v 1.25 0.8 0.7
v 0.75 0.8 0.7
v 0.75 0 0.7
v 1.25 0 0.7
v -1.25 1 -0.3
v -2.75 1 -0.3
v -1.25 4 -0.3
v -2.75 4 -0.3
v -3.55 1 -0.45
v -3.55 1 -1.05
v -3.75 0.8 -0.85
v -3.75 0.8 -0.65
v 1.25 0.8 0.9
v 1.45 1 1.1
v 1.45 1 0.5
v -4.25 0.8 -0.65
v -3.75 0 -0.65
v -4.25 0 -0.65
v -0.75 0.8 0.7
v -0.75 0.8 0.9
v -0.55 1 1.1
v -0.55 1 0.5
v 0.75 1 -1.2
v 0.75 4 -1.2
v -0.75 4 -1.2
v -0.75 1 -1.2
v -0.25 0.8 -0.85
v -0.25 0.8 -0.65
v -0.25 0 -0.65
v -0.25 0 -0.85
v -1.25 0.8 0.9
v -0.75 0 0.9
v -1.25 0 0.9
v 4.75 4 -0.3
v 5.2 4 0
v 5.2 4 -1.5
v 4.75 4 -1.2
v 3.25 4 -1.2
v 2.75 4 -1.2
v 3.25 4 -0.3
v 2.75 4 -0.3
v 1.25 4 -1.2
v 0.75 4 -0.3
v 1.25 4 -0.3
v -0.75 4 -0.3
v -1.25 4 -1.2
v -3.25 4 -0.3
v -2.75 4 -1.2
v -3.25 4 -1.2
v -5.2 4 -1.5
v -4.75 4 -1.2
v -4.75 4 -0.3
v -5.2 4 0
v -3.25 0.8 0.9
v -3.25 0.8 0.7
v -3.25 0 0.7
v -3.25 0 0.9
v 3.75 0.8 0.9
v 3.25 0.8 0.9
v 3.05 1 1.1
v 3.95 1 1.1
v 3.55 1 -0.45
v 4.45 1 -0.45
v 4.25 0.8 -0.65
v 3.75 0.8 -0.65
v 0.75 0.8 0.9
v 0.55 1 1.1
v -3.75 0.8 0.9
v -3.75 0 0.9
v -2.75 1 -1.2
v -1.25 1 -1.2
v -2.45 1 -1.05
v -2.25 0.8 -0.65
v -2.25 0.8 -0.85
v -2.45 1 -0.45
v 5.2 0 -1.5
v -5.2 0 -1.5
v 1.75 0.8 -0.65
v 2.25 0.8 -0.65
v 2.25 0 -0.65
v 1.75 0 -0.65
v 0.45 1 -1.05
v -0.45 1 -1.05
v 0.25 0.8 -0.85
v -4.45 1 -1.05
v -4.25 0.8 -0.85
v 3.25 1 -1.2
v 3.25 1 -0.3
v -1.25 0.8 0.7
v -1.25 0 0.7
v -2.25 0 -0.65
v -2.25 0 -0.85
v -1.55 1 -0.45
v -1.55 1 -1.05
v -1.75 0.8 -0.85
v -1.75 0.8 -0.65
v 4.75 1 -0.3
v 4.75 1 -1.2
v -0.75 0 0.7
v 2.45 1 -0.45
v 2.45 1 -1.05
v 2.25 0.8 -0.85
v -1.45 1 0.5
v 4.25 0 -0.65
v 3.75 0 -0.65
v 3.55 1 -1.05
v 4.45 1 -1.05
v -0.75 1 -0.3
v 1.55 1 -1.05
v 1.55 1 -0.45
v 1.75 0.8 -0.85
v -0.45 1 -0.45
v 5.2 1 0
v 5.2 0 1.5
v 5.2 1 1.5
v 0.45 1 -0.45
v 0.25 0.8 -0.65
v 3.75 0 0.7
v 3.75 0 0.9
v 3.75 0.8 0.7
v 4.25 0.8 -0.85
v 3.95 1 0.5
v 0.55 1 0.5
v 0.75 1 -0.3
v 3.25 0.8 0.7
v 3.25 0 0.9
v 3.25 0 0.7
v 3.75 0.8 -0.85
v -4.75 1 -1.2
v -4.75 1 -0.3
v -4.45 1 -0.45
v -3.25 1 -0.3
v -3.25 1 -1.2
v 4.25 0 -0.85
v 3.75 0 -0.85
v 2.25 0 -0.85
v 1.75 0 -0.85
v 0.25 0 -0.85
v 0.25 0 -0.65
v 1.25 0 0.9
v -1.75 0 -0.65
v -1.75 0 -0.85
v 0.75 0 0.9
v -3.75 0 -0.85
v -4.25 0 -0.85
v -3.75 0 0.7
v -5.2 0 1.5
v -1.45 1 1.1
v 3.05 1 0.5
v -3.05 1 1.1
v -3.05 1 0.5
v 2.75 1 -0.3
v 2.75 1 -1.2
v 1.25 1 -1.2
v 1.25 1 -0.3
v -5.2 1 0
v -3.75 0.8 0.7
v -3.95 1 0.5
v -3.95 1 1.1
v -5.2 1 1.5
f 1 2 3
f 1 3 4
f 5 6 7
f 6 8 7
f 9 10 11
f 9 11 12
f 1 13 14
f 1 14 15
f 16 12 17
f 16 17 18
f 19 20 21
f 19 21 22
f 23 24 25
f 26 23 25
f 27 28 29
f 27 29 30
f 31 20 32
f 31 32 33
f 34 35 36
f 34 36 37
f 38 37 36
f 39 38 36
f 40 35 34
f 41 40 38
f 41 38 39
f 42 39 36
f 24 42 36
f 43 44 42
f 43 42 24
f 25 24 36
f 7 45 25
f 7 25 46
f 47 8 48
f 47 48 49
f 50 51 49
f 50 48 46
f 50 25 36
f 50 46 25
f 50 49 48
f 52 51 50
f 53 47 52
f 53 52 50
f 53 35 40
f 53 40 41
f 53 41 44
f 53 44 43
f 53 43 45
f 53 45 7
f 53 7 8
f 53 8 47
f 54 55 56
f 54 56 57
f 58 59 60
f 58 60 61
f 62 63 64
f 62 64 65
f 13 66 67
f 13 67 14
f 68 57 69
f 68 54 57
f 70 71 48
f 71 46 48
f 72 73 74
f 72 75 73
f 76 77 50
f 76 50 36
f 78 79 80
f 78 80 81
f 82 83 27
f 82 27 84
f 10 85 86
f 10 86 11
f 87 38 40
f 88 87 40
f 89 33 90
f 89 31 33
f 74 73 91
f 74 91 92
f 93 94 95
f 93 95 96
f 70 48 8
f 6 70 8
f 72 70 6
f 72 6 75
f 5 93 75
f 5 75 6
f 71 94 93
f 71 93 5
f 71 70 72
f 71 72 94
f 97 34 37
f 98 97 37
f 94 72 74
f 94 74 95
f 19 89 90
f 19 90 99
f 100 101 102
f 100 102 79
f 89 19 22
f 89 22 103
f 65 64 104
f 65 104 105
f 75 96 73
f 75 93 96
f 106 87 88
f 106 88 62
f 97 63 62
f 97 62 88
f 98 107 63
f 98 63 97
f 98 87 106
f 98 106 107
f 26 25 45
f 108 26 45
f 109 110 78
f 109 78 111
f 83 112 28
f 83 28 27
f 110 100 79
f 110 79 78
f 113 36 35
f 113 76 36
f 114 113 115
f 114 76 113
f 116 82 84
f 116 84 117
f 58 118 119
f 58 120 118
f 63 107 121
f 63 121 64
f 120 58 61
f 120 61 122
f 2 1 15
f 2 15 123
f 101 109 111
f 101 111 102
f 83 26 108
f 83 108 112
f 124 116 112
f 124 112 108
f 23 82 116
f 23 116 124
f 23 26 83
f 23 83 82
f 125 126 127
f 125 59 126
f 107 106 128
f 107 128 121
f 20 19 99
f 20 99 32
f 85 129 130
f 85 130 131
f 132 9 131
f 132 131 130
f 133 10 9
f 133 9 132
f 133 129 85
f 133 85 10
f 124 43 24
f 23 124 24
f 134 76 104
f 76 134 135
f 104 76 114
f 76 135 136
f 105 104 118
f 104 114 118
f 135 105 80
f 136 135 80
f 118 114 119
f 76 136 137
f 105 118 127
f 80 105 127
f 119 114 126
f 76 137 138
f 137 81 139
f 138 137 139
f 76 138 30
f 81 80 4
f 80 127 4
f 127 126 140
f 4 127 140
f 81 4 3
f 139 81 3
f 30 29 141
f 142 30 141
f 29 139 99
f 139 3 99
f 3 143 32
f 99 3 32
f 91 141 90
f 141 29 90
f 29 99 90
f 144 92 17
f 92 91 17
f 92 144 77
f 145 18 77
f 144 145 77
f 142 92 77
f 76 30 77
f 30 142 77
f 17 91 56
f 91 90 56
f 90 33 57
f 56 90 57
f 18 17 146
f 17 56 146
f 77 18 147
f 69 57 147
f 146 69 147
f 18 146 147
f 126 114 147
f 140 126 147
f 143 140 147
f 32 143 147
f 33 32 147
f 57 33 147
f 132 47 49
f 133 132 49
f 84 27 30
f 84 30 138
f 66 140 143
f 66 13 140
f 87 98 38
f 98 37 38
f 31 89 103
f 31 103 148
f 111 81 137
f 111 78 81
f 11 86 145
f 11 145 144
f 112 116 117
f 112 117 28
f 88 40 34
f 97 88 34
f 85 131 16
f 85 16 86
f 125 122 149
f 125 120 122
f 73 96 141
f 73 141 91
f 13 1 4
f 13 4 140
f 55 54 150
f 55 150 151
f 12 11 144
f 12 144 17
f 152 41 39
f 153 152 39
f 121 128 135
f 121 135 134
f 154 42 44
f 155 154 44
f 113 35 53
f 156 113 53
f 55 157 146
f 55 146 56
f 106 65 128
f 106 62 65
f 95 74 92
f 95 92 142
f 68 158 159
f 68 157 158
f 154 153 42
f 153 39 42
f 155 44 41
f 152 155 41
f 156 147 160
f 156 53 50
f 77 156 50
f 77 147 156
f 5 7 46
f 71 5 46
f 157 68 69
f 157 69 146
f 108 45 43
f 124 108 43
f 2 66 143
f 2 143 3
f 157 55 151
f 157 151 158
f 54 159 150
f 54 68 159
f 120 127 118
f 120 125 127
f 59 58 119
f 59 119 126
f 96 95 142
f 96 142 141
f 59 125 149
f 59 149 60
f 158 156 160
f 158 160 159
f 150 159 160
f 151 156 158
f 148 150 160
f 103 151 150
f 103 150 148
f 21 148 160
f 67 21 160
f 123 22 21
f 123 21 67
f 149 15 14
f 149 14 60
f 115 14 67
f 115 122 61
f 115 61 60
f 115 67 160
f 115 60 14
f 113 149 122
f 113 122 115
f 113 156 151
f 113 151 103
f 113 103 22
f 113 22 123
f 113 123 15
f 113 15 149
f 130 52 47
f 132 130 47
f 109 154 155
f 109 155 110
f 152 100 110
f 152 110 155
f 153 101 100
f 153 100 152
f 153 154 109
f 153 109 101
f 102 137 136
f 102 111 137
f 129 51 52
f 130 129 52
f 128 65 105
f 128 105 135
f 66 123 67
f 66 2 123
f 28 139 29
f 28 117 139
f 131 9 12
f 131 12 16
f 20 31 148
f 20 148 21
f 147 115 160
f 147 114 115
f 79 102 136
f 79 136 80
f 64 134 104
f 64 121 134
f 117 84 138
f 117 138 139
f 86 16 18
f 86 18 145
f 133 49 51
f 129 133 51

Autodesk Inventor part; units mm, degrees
ref_plane "YZ Plane" through (0, 0, 0) normal (1, 0, 0) x (0, 1, 0)
ref_plane "XZ Plane" through (0, 0, 0) normal (0, 1, 0) x (-1, 0, 0)
ref_plane "XY Plane" through (0, 0, 0) normal (0, 0, 1) x (1, 0, 0)
sketch "Sketch1" plane through (0, 0, 0) normal (0, 1, 0) x (-1, 0, 0)
  line L0 (5.2, -1.5) -> (-5.2, -1.5)
  line L1 (-5.2, -1.5) -> (-5.2, 1.5)
  line L2 (-5.2, 1.5) -> (5.2, 1.5)
  line L3 (5.2, 1.5) -> (5.2, -1.5)
  line L4 (7.28, 0) -> (-7.28, 0) projected
  line L5 (0, -2.1) -> (0, 2.1) projected
  point P0 (0, 0)
  dimension "d0" = 10.4
  dimension "d1" = 3
extrude "Extrusion1" add sketch "Sketch1" along normal blind 4
sketch "Sketch2" plane through (0, 4, 0) normal (0, 1, 0) x (1, 0, 0)
  line L0 (-5.2, -1.5) -> (5.2, -1.5) projected
  line L1 (5.2, -1.5) -> (5.2, 1.5) projected
  line L2 (-5.2, -1.5) -> (5.2, -1.5)
  line L3 (5.2, -1.5) -> (5.2, 0)
  line L4 (5.2, 0) -> (-5.2, 0)
  line L5 (-5.2, 0) -> (-5.2, -1.5)
  line L6 (-4.75, 0.3) -> (-3.25, 0.3)
  line L7 (-3.25, 0.3) -> (-3.25, 1.2)
  line L8 (-3.25, 1.2) -> (-4.75, 1.2)
  line L9 (-4.75, 1.2) -> (-4.75, 0.3)
  line L10 (-5.2, 1.5) -> (-5.2, -1.5) projected
  line L11 (-2.75, 0.3) -> (-1.25, 0.3)
  line L12 (-1.25, 0.3) -> (-1.25, 1.2)
  line L13 (-1.25, 1.2) -> (-2.75, 1.2)
  line L14 (-2.75, 1.2) -> (-2.75, 0.3)
  line L15 (-0.75, 0.3) -> (0.75, 0.3)
  line L16 (0.75, 0.3) -> (0.75, 1.2)
  line L17 (0.75, 1.2) -> (-0.75, 1.2)
  line L18 (-0.75, 1.2) -> (-0.75, 0.3)
  line L19 (1.25, 0.3) -> (2.75, 0.3)
  line L20 (2.75, 0.3) -> (2.75, 1.2)
  line L21 (2.75, 1.2) -> (1.25, 1.2)
  line L22 (1.25, 1.2) -> (1.25, 0.3)
  line L23 (3.25, 0.3) -> (4.75, 0.3)
  line L24 (4.75, 0.3) -> (4.75, 1.2)
  line L25 (4.75, 1.2) -> (3.25, 1.2)
  line L26 (3.25, 1.2) -> (3.25, 0.3)
  point P0 (0, 0)
  dimension "d4" = 1.5
  dimension "d5" = 0.9
  dimension "d6" = 0.3
  dimension "d7" = 0.45
  dimension "d10" = 2
extrude "Extrusion2" cut sketch "Sketch2" against normal blind 3
sketch "Sketch3" plane through (0, 1, 0) normal (0, 1, 0) x (1, 0, 0)
  line L0 (3.75, -0.9) -> (3.25, -0.9)
  line L1 (3.25, -0.9) -> (3.25, -0.7)
  line L2 (3.25, -0.7) -> (3.75, -0.7)
  line L3 (3.75, -0.7) -> (3.75, -0.9)
  line L4 (5.2, 1.5) -> (-5.2, 1.5) projected
  line L5 (5.2, -1.5) -> (-5.2, -1.5) projected
  line L6 (5.2, 0) -> (5.2, -1.5) projected
  line L7 (1.25, -0.9) -> (0.75, -0.9)
  line L8 (0.75, -0.9) -> (0.75, -0.7)
  line L9 (0.75, -0.7) -> (1.25, -0.7)
  line L10 (1.25, -0.7) -> (1.25, -0.9)
  line L11 (-0.75, -0.9) -> (-1.25, -0.9)
  line L12 (-1.25, -0.9) -> (-1.25, -0.7)
  line L13 (-1.25, -0.7) -> (-0.75, -0.7)
  line L14 (-0.75, -0.7) -> (-0.75, -0.9)
  line L15 (-3.25, -0.9) -> (-3.75, -0.9)
  line L16 (-3.75, -0.9) -> (-3.75, -0.7)
  line L17 (-3.75, -0.7) -> (-3.25, -0.7)
  line L18 (-3.25, -0.7) -> (-3.25, -0.9)
  line L19 (-5.2, -1.5) -> (-5.2, 0) projected
  line L20 (-3.75, 0.65) -> (-4.25, 0.65)
  line L21 (-4.25, 0.65) -> (-4.25, 0.85)
  line L22 (-4.25, 0.85) -> (-3.75, 0.85)
  line L23 (-3.75, 0.85) -> (-3.75, 0.65)
  line L24 (-4.75, 0.3) -> (-4.75, 1.2) projected
  line L25 (-3.25, 1.2) -> (-3.25, 0.3) projected
  line L26 (-4.75, 1.2) -> (-3.25, 1.2) projected
  line L27 (-3.25, 0.3) -> (-4.75, 0.3) projected
  line L28 (-1.75, 0.85) -> (-1.75, 0.65)
  line L29 (-1.75, 0.65) -> (-2.25, 0.65)
  line L30 (-2.25, 0.85) -> (-1.75, 0.85)
  line L31 (-2.25, 0.65) -> (-2.25, 0.85)
  line L32 (0.25, 0.85) -> (0.25, 0.65)
  line L33 (0.25, 0.65) -> (-0.25, 0.65)
  line L34 (-0.25, 0.85) -> (0.25, 0.85)
  line L35 (-0.25, 0.65) -> (-0.25, 0.85)
  line L36 (2.25, 0.85) -> (2.25, 0.65)
  line L37 (2.25, 0.65) -> (1.75, 0.65)
  line L38 (1.75, 0.85) -> (2.25, 0.85)
  line L39 (1.75, 0.65) -> (1.75, 0.85)
  line L40 (4.25, 0.85) -> (4.25, 0.65)
  line L41 (4.25, 0.65) -> (3.75, 0.65)
  line L42 (3.75, 0.85) -> (4.25, 0.85)
  line L43 (3.75, 0.65) -> (3.75, 0.85)
  point P0 (0, 0)
  dimension "d18" = 0.2
  dimension "d19" = 0.5
  dimension "d20" = 0.6
  dimension "d21" = 1.45
  dimension "d22" = 0.2
  dimension "d23" = 0.5
  dimension "d24" = 0.2
  dimension "d25" = 0.5
  dimension "d26" = 0.2
  dimension "d27" = 0.5
  dimension "d28" = 3.95
  dimension "d29" = 1.45
  dimension "d30" = 3.95
  dimension "d36" = 0.2
  dimension "d37" = 0.5
  dimension "d38" = 0.5
  dimension "d39" = 0.5
  dimension "d40" = 0.35
  dimension "d41" = 0.35
  dimension "d44" = 2
extrude "Extrusion3" cut sketch "Sketch3" against normal up to surface (1 mm away) contours L0 L1 L2 L3 | L7 L8 L9 L10 | L11 L12 L13 L14 | L15 L16 L17 L18 | L20 L21 L22 L23 | L28 L29 L31 L30 | L32 L33 L35 L34 | L36 L37 L39 L38 | L40 L41 L43 L42
chamfer "Chamfer1" distance 0.2 angle 45 36 edges at (-3.75, 1, 0.8) (-3.5, 1, 0.7) (-3.5, 1, 0.9) (-3.25, 1, 0.8) (-1.25, 1, 0.8) (-1, 1, 0.7) (-1, 1, 0.9) (-0.75, 1, 0.8) (0.75, 1, 0.8) (1, 1, 0.7) (1, 1, 0.9) (1.25, 1, 0.8) (3.25, 1, 0.8) (3.5, 1, 0.7) (3.5, 1, 0.9) (3.75, 1, 0.8) (3.75, 1, -0.75) (4, 1, -0.65) (4.25, 1, -0.75) (4, 1, -0.85) (2.25, 1, -0.75) (2, 1, -0.85) (1.75, 1, -0.75) (2, 1, -0.65) (0, 1, -0.65) (0.25, 1, -0.75) (-0.25, 1, -0.75) (0, 1, -0.85) (-1.75, 1, -0.75) (-2, 1, -0.85) (-2, 1, -0.65) (-2.25, 1, -0.75) (-3.75, 1, -0.75) (-4, 1, -0.85) (-4, 1, -0.65) (-4.25, 1, -0.75)
equation "\"d29\" = d21"
equation "\"d30\" = d28"
equation "\"d38\" = d39"
equation "\"d40\" = d41"
properties part number "USB 3.0 A Recepticle Rear Insert Fit" material "PBT Plastic"
